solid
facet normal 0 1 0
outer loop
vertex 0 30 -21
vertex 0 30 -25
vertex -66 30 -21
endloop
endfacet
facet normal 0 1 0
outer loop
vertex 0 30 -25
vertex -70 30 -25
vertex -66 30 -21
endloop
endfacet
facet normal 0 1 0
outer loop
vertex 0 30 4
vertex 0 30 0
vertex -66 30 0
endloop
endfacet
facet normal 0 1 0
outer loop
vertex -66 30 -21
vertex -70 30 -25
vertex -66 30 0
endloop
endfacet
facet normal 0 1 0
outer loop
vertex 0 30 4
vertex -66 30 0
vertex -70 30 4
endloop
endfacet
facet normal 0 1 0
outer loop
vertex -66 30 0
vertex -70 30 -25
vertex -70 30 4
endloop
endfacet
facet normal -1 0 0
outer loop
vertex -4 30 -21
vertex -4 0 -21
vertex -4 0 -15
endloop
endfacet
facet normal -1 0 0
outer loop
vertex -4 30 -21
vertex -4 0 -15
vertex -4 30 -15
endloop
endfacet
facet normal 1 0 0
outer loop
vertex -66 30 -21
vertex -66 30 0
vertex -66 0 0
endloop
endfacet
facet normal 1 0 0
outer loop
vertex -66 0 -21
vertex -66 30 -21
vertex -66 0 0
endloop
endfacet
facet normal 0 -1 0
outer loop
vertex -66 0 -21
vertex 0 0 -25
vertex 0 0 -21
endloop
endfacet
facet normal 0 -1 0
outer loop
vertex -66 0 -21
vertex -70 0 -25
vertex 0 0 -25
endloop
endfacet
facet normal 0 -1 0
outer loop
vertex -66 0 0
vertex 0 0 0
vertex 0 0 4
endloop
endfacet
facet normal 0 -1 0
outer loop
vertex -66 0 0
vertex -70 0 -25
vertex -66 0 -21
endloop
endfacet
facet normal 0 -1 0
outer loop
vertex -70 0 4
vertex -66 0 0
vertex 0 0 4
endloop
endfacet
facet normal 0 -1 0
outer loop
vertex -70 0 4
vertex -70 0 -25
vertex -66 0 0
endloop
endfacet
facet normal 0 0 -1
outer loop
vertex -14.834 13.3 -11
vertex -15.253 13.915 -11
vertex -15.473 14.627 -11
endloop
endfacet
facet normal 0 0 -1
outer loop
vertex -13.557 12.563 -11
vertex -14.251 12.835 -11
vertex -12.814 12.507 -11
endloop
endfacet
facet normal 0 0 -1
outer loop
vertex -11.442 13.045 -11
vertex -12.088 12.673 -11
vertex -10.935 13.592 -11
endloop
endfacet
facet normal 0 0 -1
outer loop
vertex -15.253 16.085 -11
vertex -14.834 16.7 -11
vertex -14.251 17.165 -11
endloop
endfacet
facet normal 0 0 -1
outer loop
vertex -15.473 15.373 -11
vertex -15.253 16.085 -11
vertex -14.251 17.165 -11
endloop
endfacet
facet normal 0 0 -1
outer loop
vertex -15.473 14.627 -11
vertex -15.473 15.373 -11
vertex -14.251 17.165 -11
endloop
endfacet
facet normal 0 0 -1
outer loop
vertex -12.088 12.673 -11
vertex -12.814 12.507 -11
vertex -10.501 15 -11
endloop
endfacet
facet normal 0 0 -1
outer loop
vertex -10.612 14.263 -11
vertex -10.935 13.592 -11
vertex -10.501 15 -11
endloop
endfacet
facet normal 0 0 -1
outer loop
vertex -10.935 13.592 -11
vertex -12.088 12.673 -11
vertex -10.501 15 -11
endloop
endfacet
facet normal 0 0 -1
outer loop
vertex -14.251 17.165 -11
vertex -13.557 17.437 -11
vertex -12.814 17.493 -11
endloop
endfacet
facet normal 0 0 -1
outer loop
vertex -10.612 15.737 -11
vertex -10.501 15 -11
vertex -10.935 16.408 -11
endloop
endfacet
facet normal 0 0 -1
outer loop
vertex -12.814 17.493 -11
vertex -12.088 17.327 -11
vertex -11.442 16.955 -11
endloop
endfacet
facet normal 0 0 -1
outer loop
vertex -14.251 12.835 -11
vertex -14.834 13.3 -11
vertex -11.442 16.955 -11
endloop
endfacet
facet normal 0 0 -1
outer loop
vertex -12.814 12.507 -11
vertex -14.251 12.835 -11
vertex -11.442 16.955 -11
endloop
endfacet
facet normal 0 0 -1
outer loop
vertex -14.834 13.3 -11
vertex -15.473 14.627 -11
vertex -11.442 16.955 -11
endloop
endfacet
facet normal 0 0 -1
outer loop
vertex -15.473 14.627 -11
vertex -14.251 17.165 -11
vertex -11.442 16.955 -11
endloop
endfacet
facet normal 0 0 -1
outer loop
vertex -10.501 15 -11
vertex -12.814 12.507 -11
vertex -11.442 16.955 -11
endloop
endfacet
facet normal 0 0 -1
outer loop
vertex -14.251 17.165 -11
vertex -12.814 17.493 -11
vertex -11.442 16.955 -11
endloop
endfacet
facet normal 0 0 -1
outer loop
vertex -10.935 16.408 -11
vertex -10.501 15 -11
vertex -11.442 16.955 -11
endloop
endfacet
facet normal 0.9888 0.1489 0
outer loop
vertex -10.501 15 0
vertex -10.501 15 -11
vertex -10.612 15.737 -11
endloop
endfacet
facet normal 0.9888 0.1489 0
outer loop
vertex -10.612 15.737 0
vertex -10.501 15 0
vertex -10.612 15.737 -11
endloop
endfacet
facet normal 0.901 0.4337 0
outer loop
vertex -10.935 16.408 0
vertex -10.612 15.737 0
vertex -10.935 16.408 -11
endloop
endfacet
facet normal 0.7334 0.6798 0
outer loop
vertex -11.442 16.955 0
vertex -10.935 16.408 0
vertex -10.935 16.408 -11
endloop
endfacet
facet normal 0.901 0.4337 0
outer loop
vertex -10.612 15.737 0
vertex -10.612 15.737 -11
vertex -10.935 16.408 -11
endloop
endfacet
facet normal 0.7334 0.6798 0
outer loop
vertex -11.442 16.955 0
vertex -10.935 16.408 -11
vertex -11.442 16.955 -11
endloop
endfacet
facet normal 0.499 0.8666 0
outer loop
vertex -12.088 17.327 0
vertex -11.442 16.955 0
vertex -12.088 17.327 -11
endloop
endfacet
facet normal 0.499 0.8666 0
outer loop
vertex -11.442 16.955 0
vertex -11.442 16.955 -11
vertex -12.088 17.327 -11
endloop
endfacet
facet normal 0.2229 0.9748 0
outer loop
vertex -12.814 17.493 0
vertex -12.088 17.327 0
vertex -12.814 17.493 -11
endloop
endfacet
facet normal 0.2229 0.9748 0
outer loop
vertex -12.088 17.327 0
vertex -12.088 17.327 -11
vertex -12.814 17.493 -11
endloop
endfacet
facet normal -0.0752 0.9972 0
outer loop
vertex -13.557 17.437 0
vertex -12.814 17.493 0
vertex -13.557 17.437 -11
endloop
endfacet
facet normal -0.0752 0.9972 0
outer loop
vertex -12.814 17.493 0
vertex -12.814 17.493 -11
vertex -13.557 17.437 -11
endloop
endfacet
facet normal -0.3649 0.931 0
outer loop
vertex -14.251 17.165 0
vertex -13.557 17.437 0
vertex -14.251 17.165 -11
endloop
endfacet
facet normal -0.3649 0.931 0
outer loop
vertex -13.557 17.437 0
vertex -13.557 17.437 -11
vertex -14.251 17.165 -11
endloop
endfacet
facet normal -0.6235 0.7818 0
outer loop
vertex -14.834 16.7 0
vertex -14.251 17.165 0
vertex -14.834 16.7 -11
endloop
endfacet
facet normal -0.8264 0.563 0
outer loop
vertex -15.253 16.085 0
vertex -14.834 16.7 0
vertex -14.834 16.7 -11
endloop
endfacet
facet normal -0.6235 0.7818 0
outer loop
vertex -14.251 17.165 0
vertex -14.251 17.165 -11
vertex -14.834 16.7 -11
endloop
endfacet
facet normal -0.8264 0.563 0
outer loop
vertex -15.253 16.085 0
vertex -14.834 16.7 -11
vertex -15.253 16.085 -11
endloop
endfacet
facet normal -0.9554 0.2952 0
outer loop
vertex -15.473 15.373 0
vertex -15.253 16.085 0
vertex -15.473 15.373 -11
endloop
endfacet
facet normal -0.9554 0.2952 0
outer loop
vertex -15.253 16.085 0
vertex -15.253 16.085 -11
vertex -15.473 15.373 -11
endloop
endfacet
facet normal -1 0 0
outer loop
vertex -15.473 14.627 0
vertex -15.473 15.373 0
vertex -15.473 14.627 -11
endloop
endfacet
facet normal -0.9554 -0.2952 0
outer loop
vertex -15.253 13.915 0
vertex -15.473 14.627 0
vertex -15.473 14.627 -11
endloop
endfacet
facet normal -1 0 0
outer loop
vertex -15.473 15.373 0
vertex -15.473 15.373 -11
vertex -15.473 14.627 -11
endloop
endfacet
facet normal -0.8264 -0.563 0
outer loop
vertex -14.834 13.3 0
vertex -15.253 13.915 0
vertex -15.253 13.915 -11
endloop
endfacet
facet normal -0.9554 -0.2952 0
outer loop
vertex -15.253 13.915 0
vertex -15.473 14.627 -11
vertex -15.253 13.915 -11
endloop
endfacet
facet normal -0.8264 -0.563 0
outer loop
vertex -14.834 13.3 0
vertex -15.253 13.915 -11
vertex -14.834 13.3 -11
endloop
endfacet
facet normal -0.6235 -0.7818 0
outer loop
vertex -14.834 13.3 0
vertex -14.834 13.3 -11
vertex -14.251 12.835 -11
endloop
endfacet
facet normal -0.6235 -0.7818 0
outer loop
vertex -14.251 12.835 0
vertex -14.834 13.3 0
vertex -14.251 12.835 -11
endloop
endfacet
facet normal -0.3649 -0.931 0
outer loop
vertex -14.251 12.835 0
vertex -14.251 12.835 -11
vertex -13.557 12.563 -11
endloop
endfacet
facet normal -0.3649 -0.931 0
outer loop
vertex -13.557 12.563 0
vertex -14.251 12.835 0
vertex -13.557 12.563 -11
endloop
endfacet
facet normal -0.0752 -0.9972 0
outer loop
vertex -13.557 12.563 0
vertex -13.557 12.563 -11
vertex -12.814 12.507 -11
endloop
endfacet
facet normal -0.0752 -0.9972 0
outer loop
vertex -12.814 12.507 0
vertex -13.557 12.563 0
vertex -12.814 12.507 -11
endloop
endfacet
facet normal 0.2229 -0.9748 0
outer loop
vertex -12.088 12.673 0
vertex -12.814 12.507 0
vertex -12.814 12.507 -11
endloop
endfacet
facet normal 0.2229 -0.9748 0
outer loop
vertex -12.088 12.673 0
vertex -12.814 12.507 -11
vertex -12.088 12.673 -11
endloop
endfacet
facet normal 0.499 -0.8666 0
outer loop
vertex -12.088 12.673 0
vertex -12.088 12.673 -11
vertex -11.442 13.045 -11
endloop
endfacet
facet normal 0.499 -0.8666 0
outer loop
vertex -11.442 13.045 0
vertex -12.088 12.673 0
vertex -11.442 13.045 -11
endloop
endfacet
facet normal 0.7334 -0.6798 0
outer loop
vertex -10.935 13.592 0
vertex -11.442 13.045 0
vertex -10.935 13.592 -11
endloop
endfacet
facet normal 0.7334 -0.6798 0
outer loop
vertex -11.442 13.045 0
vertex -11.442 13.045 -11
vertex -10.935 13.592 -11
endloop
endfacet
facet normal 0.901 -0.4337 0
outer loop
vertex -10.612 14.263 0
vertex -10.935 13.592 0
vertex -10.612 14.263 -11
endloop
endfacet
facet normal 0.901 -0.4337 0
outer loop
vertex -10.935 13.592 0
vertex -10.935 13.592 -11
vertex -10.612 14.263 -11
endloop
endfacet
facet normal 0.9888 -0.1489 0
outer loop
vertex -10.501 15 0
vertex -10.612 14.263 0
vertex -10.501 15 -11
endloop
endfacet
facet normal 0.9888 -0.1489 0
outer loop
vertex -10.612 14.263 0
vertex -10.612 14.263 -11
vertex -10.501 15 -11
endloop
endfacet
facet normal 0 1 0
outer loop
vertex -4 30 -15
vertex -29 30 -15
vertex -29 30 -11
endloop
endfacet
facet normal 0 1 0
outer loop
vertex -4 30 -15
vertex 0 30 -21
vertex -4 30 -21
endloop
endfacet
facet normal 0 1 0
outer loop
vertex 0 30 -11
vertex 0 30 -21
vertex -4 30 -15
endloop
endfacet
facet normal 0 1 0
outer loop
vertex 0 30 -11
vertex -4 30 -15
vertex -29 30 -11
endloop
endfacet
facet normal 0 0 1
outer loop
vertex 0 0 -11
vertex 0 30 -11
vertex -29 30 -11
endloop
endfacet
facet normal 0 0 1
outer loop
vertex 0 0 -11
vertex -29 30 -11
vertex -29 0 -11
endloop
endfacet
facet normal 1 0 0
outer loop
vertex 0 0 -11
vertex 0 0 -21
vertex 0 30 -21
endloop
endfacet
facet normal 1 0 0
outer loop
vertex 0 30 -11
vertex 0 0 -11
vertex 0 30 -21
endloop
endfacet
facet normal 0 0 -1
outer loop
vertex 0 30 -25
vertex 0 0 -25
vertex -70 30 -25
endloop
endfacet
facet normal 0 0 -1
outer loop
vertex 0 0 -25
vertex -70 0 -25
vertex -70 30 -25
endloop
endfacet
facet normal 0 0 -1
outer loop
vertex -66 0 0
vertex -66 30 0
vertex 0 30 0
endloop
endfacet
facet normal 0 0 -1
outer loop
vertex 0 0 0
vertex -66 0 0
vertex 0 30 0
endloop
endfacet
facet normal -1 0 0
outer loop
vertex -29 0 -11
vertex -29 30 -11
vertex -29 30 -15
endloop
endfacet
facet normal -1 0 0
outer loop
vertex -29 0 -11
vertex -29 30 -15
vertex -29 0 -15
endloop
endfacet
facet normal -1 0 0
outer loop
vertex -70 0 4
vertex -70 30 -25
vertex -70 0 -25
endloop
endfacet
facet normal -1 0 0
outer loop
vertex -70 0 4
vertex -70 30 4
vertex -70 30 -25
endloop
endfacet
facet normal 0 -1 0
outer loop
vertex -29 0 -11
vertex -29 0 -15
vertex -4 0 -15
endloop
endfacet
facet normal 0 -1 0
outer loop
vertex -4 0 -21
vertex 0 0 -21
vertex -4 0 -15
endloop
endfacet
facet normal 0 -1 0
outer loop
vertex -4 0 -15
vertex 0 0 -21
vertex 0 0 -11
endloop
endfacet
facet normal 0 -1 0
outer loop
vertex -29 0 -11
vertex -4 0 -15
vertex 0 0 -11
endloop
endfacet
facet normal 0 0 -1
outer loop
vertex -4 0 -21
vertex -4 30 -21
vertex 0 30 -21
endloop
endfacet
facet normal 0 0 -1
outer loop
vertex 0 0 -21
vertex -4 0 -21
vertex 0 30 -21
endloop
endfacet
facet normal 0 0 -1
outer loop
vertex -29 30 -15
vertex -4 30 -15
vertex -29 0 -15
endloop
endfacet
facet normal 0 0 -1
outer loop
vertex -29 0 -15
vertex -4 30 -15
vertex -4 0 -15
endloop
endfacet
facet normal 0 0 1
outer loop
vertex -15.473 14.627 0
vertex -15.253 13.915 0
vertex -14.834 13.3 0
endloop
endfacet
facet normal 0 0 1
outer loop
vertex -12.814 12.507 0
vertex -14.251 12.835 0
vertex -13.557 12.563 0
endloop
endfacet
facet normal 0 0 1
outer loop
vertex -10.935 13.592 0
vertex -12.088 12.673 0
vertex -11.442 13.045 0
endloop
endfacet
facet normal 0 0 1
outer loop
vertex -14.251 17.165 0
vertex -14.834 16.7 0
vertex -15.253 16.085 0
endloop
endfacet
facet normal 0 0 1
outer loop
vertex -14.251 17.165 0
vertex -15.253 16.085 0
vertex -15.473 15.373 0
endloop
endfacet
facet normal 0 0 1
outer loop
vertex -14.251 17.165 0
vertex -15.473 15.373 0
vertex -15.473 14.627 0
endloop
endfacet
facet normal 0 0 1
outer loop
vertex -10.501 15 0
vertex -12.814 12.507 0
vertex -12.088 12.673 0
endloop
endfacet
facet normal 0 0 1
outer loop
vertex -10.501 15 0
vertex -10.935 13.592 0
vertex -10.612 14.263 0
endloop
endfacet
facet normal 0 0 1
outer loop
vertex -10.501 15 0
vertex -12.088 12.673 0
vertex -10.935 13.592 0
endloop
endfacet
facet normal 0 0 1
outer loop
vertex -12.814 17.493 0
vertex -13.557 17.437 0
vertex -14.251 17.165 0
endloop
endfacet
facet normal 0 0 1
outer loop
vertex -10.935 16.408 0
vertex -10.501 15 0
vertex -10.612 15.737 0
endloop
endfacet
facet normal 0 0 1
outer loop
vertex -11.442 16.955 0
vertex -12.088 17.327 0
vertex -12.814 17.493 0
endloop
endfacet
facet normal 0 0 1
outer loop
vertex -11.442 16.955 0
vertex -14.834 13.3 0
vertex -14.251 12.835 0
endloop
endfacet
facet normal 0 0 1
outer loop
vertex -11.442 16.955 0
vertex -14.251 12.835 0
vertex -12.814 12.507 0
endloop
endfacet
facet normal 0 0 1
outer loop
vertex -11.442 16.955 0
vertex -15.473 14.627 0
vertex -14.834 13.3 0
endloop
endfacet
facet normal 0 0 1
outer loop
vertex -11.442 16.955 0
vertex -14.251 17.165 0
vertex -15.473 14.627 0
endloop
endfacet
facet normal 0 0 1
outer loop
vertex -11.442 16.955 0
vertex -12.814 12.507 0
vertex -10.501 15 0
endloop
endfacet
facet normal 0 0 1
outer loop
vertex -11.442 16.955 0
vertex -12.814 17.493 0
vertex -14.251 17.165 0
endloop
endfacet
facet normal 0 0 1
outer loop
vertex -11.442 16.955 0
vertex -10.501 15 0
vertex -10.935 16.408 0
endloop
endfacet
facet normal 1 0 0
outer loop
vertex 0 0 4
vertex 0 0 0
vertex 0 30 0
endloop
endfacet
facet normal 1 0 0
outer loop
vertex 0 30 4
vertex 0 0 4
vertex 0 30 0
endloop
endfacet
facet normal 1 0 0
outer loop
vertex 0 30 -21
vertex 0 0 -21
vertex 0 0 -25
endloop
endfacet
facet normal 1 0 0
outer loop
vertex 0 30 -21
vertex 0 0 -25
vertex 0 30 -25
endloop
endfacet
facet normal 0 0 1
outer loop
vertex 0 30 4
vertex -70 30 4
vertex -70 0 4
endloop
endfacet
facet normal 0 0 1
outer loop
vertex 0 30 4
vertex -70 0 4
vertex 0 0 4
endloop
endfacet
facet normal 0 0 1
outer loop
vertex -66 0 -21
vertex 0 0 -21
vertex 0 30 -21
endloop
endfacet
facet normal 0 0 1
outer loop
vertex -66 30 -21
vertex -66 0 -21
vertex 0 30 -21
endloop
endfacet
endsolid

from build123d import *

# Parameters (mm, degrees)
F0_W      = 70
F0_H      = 30
F1_DEPTH  = 4
F2_W      = 4
F2_H      = 30
F3_DEPTH  = 25
F4_W      = 30
F4_H      = 4
F5_DEPTH  = 66
F6_W      = 4
F6_H      = 30
F7_DEPTH  = 10
F8_W      = 30
F8_H      = 4
F9_DEPTH  = 25
F10_R     = 2.5
F11_DEPTH = 11


with BuildPart() as f1:
    # F0 (on Top) → F1 (new body)
    with BuildSketch(Plane.XY):
        with Locations((-35, 15)):
            Rectangle(F0_W, F0_H)
    extrude(amount=F1_DEPTH)

    # F2 (on face) → F3 (join)
    with BuildSketch(Plane(origin=(0, 0, 0), x_dir=(1, 0, 0), z_dir=(0, 0, -1))):
        with Locations((-68, -15)):
            Rectangle(F2_W, F2_H)
    extrude(amount=F3_DEPTH)

    # F4 (on face) → F5 (join)
    with BuildSketch(Plane.YZ.offset(-66)):
        with Locations((15, -23)):
            Rectangle(F4_W, F4_H)
    extrude(amount=F5_DEPTH)


with BuildPart() as f7:
    # F6 (on face) → F7 (new body)
    with BuildSketch(Plane.XY.offset(-21)):
        with Locations((-2, 15)):
            Rectangle(F6_W, F6_H)
    extrude(amount=F7_DEPTH)

    # F8 (on face) → F9 (join)
    with BuildSketch(Plane(origin=(-4, 0, 0), x_dir=(0, -1, 0), z_dir=(-1, 0, 0))):
        with Locations((-15, -13)):
            Rectangle(F8_W, F8_H)
    extrude(amount=F9_DEPTH)


with BuildPart() as f11:
    # F10 (on face) → F11 (new body)
    with BuildSketch(Plane.XY.offset(-11)):
        with Locations((-13.000882, 15)):
            Circle(F10_R)
    extrude(amount=F11_DEPTH)


solid = Compound([f1.part, f7.part, f11.part])
